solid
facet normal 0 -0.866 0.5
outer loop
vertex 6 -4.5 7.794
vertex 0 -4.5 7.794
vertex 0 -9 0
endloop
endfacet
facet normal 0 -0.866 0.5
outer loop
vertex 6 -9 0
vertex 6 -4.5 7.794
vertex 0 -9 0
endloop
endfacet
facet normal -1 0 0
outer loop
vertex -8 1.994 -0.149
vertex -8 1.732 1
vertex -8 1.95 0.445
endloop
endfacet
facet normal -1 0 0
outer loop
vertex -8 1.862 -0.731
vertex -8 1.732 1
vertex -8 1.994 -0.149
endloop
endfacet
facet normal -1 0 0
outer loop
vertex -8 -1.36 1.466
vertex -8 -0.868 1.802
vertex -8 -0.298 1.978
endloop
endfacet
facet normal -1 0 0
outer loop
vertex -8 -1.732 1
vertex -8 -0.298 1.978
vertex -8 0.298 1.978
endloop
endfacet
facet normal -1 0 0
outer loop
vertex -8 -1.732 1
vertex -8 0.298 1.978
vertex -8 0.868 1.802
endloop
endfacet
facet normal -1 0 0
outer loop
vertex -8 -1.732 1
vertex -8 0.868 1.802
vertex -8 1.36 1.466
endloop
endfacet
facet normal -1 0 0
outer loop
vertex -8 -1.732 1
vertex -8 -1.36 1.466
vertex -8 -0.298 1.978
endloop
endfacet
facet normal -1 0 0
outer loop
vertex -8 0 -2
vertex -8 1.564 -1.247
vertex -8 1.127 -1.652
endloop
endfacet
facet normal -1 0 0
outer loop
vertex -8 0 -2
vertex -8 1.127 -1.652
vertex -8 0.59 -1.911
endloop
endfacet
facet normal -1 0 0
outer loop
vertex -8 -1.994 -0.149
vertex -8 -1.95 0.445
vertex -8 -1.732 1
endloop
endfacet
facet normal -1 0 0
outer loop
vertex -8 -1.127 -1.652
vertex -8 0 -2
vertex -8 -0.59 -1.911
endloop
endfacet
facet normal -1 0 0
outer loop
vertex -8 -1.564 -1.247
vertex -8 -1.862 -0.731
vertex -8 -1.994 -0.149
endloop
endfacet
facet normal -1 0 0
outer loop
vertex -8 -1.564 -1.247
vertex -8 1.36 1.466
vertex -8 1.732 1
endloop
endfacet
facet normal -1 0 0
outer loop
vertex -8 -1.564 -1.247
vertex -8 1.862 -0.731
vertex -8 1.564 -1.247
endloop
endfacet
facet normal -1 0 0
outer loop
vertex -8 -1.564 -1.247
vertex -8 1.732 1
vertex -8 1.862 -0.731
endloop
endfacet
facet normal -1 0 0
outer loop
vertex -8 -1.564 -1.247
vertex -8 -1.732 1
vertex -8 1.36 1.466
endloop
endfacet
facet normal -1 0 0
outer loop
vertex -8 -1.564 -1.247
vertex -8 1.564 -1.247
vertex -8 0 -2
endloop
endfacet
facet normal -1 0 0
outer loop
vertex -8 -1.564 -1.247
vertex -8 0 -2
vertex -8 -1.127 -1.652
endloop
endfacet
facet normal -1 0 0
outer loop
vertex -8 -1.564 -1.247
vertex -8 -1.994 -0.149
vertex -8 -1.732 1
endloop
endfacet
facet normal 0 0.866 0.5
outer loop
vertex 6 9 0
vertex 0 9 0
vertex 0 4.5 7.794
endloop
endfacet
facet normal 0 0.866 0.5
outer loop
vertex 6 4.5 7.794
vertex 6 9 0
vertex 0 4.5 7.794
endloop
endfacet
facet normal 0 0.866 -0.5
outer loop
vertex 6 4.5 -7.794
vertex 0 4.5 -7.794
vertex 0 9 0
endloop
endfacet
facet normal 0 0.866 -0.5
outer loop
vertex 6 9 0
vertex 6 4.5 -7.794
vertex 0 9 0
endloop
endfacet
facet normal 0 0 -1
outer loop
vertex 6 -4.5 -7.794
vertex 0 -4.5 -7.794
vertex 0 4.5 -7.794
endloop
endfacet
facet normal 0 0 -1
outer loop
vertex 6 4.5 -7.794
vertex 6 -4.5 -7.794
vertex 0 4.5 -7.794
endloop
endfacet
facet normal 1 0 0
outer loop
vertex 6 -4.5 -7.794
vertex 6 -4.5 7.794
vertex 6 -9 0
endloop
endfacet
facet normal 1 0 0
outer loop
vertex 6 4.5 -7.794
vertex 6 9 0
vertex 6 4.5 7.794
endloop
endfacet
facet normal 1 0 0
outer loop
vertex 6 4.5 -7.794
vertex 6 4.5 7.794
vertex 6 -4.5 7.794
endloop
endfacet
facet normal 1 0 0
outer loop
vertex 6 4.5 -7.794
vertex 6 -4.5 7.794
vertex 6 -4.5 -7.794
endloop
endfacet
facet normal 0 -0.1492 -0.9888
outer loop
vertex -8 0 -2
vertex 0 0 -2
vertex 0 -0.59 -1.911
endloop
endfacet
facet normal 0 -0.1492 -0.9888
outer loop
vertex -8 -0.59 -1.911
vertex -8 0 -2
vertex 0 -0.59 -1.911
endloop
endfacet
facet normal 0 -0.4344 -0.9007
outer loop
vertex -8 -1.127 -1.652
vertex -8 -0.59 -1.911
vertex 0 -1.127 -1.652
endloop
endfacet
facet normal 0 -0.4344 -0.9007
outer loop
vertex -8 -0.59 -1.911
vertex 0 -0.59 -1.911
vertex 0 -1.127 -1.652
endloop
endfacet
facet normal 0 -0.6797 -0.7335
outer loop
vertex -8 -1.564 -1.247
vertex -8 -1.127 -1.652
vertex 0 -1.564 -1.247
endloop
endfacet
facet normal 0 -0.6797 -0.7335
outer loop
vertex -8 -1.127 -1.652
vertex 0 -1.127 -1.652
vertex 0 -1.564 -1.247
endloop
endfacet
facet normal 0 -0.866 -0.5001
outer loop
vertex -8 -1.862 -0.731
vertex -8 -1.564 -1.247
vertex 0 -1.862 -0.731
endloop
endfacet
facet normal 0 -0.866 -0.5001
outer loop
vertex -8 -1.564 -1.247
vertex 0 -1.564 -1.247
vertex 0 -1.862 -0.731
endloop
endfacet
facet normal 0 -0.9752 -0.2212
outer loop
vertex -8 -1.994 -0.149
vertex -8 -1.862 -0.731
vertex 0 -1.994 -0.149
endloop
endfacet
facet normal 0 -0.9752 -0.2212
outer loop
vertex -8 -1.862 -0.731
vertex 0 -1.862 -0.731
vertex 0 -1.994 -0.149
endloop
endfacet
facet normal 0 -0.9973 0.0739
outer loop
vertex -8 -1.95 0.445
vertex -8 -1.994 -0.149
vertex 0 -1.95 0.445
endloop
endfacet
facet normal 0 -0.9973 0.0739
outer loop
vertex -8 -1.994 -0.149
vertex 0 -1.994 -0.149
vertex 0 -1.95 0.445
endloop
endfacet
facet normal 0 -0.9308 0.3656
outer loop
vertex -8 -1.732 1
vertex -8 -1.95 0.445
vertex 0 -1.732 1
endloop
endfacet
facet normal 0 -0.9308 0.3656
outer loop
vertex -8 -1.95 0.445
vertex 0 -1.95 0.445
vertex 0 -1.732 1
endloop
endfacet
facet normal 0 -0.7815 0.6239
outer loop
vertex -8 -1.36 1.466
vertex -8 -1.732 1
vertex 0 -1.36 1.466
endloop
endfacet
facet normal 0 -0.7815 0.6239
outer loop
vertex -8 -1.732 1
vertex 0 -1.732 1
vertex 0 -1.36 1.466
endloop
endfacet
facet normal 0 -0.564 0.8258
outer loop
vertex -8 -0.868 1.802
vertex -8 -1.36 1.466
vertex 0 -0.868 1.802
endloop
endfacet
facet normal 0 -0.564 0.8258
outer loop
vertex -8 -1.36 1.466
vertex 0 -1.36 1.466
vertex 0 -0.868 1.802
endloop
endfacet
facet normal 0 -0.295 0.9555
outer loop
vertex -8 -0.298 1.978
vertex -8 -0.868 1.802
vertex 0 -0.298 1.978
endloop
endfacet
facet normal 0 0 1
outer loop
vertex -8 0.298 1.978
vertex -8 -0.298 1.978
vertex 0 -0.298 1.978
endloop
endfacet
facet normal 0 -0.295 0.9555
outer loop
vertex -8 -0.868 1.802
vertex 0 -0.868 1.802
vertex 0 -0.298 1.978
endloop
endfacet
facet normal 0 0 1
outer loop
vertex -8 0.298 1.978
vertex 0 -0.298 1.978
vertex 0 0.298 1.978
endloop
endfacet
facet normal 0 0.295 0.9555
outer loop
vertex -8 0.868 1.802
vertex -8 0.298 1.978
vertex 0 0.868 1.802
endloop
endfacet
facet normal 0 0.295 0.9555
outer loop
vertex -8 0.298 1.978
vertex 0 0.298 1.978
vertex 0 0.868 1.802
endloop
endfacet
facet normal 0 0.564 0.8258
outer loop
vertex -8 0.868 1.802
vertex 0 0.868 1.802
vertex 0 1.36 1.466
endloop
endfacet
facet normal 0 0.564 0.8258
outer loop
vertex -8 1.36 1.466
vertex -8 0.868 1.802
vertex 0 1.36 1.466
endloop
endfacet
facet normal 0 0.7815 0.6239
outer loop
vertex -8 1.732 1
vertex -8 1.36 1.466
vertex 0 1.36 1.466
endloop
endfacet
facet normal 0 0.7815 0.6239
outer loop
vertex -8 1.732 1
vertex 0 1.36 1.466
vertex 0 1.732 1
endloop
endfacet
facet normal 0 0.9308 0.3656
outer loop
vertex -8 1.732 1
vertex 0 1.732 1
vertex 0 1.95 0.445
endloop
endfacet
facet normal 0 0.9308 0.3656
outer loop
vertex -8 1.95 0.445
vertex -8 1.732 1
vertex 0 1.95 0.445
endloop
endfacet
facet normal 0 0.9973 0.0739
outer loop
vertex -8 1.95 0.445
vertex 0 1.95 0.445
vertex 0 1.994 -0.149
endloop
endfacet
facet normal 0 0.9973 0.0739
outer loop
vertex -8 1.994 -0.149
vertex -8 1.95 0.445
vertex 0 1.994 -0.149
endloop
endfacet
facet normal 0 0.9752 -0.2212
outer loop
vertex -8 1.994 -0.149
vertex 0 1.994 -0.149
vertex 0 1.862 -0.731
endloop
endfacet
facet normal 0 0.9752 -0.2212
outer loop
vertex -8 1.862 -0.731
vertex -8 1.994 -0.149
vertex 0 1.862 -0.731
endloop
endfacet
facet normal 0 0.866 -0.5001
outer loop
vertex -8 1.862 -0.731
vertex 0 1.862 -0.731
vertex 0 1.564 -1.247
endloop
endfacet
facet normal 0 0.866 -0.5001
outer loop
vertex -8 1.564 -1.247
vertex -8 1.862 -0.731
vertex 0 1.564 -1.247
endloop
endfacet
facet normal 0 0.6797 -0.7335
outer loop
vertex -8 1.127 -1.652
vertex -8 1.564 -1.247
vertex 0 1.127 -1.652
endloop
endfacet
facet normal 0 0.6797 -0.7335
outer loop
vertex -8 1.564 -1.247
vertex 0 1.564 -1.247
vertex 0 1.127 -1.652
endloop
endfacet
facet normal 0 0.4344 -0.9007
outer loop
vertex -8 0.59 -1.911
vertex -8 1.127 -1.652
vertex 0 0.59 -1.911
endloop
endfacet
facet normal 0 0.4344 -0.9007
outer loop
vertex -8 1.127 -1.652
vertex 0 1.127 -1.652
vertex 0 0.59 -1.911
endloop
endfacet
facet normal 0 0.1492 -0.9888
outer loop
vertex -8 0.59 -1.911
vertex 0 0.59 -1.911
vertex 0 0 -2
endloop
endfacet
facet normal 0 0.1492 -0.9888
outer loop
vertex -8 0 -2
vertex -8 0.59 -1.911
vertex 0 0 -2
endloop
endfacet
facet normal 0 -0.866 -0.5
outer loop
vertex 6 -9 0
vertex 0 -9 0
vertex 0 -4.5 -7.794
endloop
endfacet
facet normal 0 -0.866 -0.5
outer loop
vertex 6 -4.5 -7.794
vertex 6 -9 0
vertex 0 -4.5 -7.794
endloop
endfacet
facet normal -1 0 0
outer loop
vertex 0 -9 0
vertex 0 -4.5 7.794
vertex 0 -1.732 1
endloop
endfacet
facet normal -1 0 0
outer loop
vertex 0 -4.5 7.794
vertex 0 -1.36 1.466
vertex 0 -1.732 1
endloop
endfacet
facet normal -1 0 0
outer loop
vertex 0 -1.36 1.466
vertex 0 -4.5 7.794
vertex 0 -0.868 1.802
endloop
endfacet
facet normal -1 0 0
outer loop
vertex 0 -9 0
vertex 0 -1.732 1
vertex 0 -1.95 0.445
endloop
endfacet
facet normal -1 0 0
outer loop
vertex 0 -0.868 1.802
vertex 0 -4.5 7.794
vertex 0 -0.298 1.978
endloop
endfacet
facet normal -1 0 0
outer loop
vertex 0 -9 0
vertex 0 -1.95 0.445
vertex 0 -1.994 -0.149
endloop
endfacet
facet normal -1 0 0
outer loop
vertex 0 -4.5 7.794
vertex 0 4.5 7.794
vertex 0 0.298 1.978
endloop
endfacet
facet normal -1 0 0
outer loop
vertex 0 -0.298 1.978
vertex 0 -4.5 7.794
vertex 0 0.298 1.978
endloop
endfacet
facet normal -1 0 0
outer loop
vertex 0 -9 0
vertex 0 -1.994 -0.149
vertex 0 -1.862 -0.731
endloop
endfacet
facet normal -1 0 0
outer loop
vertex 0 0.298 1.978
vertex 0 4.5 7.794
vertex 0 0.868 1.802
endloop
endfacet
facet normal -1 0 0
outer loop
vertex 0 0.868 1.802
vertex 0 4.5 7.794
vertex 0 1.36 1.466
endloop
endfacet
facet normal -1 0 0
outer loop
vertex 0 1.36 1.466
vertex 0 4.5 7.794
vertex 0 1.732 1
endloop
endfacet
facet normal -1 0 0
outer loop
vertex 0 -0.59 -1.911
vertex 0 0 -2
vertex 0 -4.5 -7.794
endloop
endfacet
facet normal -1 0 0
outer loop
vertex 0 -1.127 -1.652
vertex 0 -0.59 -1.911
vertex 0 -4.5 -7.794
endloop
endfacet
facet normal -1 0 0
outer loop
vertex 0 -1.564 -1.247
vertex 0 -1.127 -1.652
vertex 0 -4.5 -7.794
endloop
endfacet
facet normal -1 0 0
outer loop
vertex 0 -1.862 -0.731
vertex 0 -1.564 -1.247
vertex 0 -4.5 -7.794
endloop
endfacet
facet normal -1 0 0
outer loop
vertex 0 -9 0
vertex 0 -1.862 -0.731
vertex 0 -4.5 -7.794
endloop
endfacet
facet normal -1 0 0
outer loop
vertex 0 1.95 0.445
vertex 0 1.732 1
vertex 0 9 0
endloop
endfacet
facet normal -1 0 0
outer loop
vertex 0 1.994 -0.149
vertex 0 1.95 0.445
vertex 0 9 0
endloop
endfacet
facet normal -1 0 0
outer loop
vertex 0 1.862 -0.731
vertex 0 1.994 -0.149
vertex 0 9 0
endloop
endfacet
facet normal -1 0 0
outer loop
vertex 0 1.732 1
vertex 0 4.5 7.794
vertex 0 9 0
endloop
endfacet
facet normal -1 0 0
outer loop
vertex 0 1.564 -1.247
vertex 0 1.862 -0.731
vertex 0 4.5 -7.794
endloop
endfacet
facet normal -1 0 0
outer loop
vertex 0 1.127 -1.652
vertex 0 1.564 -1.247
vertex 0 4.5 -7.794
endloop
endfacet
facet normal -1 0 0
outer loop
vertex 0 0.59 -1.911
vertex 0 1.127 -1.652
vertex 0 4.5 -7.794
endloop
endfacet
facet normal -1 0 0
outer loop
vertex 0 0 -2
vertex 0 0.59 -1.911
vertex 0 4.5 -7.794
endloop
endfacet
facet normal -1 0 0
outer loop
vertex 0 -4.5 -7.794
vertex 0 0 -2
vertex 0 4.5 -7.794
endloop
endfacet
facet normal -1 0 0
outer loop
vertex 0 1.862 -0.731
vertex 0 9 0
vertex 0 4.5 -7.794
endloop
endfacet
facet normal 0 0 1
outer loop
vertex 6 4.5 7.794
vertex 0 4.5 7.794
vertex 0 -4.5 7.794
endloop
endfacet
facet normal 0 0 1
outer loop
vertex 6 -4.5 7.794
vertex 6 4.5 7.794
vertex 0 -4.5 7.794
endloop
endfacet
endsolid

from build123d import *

# Parameters (mm, degrees)
BOSS_EXTRUDE1_DEPTH = 6
SKETCH2_R           = 2
BOSS_EXTRUDE2_DEPTH = 8


with BuildPart() as part:
    # Sketch1 → Boss-Extrude1 (new body)
    with BuildSketch(Plane(origin=(0, 0, 0), x_dir=(0, 0, -1), z_dir=(1, 0, 0))):
        Polygon((0, -9), (7.794228634, -4.5), (7.794228634, 4.5), (0, 9), (-7.794228634, 4.5), (-7.794228634, -4.5), align=None)
    extrude(amount=BOSS_EXTRUDE1_DEPTH)

    # Sketch2 → Boss-Extrude2 (add)
    with BuildSketch(Plane.ZY):
        with Locations(Location((0, 0, 0), (0, 0, 180))):
            Circle(SKETCH2_R)
    extrude(amount=BOSS_EXTRUDE2_DEPTH)


solid = part.part
